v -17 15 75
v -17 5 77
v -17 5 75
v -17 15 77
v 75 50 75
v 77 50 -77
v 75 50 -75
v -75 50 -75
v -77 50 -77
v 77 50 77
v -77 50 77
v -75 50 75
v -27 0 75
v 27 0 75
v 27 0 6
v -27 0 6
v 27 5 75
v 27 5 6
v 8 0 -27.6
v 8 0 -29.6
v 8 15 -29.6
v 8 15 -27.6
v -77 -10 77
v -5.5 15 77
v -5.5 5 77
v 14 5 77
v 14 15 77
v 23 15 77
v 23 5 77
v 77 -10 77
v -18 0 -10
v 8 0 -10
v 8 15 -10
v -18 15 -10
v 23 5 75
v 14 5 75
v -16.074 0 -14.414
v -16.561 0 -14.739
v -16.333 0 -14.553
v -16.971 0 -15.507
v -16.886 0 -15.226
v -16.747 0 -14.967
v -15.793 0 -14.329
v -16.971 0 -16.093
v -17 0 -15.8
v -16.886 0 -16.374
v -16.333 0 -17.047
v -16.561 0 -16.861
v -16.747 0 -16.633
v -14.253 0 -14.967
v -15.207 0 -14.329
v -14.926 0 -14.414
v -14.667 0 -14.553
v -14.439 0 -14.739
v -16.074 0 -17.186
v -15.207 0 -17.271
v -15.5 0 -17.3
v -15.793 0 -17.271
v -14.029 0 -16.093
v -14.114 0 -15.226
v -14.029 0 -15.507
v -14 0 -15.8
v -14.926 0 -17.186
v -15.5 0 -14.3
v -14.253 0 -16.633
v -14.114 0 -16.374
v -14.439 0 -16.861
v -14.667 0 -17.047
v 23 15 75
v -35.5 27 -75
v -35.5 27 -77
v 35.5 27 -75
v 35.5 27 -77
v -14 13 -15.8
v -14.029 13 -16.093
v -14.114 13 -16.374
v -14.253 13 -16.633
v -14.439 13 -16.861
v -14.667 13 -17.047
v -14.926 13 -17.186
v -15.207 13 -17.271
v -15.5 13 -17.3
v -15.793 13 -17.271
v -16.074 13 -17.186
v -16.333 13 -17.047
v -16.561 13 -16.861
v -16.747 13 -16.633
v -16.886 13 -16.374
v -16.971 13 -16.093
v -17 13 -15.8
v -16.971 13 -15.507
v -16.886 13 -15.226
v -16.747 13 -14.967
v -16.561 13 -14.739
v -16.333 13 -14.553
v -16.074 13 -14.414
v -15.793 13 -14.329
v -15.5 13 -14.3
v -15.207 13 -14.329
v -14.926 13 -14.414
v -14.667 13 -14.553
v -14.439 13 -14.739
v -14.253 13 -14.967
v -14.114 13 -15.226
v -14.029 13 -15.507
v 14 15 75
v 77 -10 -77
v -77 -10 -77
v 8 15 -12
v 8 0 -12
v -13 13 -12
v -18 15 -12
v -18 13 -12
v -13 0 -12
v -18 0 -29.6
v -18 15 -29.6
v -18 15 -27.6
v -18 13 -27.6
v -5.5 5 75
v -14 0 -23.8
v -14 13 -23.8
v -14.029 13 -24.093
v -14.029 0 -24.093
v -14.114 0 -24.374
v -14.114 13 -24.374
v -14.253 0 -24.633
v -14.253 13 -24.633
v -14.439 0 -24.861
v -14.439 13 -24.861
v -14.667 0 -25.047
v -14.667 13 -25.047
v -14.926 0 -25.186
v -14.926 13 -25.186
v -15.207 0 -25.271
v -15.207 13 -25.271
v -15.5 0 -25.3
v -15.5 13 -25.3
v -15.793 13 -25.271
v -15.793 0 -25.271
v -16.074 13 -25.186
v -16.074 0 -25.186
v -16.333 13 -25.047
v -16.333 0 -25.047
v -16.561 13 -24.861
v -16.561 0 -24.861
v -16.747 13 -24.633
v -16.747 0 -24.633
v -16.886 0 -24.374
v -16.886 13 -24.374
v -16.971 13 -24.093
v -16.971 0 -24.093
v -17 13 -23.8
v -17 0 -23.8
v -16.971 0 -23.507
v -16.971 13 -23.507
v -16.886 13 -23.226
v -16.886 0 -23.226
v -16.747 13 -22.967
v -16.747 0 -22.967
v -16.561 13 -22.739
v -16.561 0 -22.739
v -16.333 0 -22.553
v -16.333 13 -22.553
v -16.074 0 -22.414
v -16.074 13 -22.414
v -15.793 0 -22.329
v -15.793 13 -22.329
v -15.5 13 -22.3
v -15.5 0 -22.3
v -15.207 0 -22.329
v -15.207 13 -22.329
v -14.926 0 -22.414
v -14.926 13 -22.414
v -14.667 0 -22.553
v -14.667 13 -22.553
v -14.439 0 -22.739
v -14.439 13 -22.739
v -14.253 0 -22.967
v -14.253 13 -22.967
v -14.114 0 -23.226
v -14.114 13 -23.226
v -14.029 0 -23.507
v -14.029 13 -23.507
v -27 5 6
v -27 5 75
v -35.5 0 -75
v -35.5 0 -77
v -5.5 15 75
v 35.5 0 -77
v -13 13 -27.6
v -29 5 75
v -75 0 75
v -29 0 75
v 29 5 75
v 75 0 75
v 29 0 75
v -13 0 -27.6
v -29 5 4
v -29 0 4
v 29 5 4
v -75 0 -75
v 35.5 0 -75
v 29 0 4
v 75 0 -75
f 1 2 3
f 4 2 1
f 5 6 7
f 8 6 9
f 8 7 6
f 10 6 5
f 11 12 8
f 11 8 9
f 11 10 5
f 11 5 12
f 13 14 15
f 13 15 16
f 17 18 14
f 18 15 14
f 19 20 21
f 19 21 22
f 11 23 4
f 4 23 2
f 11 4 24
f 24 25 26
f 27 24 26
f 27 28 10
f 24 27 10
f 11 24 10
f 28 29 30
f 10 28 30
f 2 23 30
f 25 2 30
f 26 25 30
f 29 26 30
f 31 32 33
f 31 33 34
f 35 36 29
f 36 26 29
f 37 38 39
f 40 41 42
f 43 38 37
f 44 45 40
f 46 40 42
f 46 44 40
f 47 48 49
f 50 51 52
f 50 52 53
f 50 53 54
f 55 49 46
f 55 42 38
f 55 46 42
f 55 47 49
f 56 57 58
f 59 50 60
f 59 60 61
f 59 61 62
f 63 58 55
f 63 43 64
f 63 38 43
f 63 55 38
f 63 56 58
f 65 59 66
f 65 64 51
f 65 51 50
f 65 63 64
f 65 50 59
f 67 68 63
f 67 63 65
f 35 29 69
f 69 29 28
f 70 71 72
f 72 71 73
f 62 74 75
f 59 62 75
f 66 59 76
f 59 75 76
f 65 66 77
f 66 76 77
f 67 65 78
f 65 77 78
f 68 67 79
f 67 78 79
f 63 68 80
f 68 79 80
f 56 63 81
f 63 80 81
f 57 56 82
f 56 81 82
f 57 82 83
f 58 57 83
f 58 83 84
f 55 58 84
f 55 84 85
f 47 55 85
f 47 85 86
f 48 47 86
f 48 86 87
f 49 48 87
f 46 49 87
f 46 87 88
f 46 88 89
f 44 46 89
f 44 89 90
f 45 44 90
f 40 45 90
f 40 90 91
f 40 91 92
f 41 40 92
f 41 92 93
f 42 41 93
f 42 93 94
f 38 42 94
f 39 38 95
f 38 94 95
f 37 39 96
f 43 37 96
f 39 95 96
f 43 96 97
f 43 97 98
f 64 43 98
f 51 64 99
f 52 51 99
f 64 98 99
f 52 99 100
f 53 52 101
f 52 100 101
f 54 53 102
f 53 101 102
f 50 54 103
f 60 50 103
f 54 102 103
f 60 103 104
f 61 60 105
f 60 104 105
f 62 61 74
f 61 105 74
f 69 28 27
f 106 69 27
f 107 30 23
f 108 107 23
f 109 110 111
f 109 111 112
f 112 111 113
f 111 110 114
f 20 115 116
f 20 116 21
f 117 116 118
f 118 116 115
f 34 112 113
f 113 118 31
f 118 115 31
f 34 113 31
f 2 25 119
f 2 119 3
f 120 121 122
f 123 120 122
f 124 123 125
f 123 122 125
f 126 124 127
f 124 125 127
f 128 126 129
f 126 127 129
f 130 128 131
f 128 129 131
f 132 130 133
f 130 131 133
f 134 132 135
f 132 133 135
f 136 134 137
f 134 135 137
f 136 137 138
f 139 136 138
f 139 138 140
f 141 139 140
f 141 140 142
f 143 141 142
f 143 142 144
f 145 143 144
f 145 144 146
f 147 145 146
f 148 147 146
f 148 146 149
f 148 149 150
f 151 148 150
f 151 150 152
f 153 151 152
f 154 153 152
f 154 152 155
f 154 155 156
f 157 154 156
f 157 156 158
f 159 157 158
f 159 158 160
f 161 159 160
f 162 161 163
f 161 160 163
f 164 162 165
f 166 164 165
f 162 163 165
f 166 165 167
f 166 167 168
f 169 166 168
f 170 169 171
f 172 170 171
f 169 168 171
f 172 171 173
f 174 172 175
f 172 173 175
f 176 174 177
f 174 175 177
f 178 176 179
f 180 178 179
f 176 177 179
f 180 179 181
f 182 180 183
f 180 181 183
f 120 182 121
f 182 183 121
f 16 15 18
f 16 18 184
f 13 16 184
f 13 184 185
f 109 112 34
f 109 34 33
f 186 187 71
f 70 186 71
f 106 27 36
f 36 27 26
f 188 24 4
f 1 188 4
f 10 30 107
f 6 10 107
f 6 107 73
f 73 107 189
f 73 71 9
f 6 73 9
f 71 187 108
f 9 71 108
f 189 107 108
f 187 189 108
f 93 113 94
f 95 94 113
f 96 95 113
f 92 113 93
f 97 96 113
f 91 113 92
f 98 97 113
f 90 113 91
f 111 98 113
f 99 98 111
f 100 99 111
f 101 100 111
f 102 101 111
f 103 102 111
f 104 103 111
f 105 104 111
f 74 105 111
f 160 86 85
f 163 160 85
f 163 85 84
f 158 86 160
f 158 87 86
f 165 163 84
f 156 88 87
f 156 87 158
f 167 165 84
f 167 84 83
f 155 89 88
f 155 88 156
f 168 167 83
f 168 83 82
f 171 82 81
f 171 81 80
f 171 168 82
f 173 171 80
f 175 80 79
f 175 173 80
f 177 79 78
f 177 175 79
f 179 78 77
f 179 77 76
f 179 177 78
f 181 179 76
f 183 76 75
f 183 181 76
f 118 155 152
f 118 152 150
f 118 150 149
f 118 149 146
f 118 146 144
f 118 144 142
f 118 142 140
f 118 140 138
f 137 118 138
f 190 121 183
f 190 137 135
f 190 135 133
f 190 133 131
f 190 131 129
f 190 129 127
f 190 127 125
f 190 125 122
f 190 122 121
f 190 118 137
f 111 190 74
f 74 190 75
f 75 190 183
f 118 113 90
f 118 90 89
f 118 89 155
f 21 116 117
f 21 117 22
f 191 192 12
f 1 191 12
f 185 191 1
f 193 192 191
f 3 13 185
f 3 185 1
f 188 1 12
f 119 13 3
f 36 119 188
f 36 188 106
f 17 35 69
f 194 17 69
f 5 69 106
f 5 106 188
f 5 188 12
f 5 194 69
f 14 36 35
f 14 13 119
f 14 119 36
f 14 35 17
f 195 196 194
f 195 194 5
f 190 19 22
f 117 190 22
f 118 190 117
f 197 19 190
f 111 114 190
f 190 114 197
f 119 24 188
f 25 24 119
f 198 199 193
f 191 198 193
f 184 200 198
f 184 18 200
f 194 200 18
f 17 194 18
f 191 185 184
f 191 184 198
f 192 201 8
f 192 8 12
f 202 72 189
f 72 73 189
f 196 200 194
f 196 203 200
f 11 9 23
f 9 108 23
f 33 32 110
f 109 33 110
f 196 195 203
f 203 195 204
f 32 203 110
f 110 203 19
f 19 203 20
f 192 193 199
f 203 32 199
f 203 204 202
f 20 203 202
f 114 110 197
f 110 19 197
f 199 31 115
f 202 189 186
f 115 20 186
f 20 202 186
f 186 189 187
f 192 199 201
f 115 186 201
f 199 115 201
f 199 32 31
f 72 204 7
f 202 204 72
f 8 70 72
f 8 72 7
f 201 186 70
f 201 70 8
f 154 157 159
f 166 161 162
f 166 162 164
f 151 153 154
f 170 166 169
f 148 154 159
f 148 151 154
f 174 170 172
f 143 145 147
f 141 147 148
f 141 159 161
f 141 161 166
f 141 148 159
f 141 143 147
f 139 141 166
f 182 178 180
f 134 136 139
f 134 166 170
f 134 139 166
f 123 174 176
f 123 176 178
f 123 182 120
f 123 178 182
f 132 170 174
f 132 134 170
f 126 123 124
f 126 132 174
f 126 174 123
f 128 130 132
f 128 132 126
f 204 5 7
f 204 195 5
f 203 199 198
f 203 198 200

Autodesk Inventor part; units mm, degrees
ref_plane "YZ Plane" through (0, 0, 0) normal (1, 0, 0) x (0, 1, 0)
ref_plane "XZ Plane" through (0, 0, 0) normal (0, 1, 0) x (-1, 0, 0)
ref_plane "XY Plane" through (0, 0, 0) normal (0, 0, 1) x (1, 0, 0)
sketch "草图1" plane through (0, 0, 0) normal (0, 1, 0) x (-1, 0, 0)
  line L0 (77, 77) -> (-77, 77)
  line L1 (-77, 77) -> (-77, -77)
  line L2 (-77, -77) -> (77, -77)
  line L3 (77, -77) -> (77, 77)
  line L4 (0, 0) -> (0, -24)
  line L5 (0, 0) -> (17, 0)
  line L6 (75, 75) -> (-75, 75)
  line L7 (-75, 75) -> (-75, -75)
  line L8 (-75, -75) -> (75, -75)
  line L9 (75, -75) -> (75, 75)
  line L10 (-27, 6) -> (27, 6)
  line L11 (29, 4) -> (-29, 4)
  line L12 (29, 4) -> (29, 75)
  line L13 (-29, 4) -> (-29, 75)
  line L14 (27, 6) -> (27, 75)
  line L15 (-27, 6) -> (-27, 75)
  dimension "d1" = 154
  dimension "d2" = 154
  dimension "d3" = 150
  dimension "d4" = 150
  dimension "d5" = 54
  dimension "d6" = 58
  dimension "d7" = 71
  dimension "d8" = 69
sketch "草图4" plane through (0, 0, 0) normal (0, 1, 0) x (-1, 0, 0)
  line L0 (77, 77) -> (-77, 77)
  line L1 (-77, 77) -> (-77, -77)
  line L2 (-77, -77) -> (77, -77)
  line L3 (77, -77) -> (77, 77)
  line L4 (0, 0) -> (0, -178.4057)
  line L5 (0, 0) -> (-63.1988, 0)
  line L6 (75, 75) -> (-75, 75)
  line L7 (-75, 75) -> (-75, -75)
  line L8 (-75, -75) -> (75, -75)
  line L9 (75, -75) -> (75, 75)
  line L10 (-27, 6) -> (27, 6)
  line L11 (29, 4) -> (-29, 4)
  line L12 (29, 4) -> (29, 75)
  line L13 (-29, 4) -> (-29, 75)
  line L14 (27, 6) -> (27, 75)
  line L15 (-27, 6) -> (-27, 75)
  dimension "d11" = 154
  dimension "d12" = 154
  dimension "d13" = 150
  dimension "d14" = 150
  dimension "d15" = 54
  dimension "d16" = 58
  dimension "d17" = 71
  dimension "d18" = 69
sketch "草图5" plane through (0, 0, 0) normal (0, 1, 0) x (-1, 0, 0)
  line L0 (77, 77) -> (-77, 77)
  line L1 (-77, 77) -> (-77, -77)
  line L2 (-77, -77) -> (77, -77)
  line L3 (77, -77) -> (77, 77)
  line L4 (0, 0) -> (0, -24)
  line L5 (0, 0) -> (17, 0)
  line L6 (75, 75) -> (-75, 75)
  line L7 (-75, 75) -> (-75, -75)
  line L8 (-75, -75) -> (75, -75)
  line L9 (75, -75) -> (75, 75)
  line L10 (-27, 6) -> (27, 6)
  line L11 (29, 4) -> (-29, 4)
  line L12 (29, 4) -> (29, 75)
  line L13 (-29, 4) -> (-29, 75)
  line L14 (27, 6) -> (27, 75)
  line L15 (-27, 6) -> (-27, 75)
  dimension "d19" = 154
  dimension "d20" = 154
  dimension "d21" = 150
  dimension "d22" = 150
  dimension "d23" = 54
  dimension "d24" = 58
  dimension "d25" = 71
  dimension "d26" = 69
sketch "草图6" plane through (0, 0, 0) normal (0, 1, 0) x (-1, 0, 0)
  line L0 (0, 0) -> (0, -24)
  line L1 (0, 0) -> (17, 0)
  line L2 (-75, 75) -> (-75, -75)
  line L3 (-77, 77) -> (-77, -77)
  line L4 (29, 4) -> (-29, 4)
  line L5 (-27, 6) -> (27, 6)
  line L6 (75, 75) -> (-75, 75)
  line L7 (77, 77) -> (-77, 77)
  line L8 (29, 4) -> (29, 75)
  line L9 (27, 6) -> (27, 75)
  line L10 (-29, 4) -> (-29, 75)
  line L11 (-27, 6) -> (-27, 75)
  line L12 (-77, -77) -> (77, -77)
  line L13 (-75, -75) -> (75, -75)
  line L14 (77, -77) -> (77, 77)
  line L15 (75, -75) -> (75, 75)
  dimension "d27" = 154
  dimension "d28" = 154
  dimension "d29" = 150
  dimension "d30" = 150
  dimension "d31" = 54
  dimension "d32" = 58
  dimension "d33" = 71
  dimension "d34" = 69
extrude "拉伸2" add sketch "草图4" along normal blind 5 contours L3 L2 L1 L0 | L6 L15 L10 L14 L12 L11 L13
extrude "拉伸3" add sketch "草图1" against normal blind 10 contours L3 L2 L1 L0 | L9 L8 L7 L6 L13 L11 L12 | L12 L11 L13 L6 L15 L10 L14 | L14 L10 L15 L6
extrude "拉伸4" add sketch "草图5" along normal blind 50
sketch "草图7" plane through (-77, -10, 77) normal (0, 0, 1) x (1, 0, 0)
  line L0 (77, 10) -> (104, 10)
  line L1 (2, 10) -> (152, 10) projected
  line L2 (104, 10) -> (104, 25)
  line L3 (104, 25) -> (50, 25)
  line L4 (50, 25) -> (50, 10)
  line L5 (50, 10) -> (104, 10)
  line L6 (77, 10) -> (77, 15)
  line L7 (77, 15) -> (50, 15)
  line L8 (60, 15) -> (60, 25)
  line L9 (60, 25) -> (50, 25)
  line L10 (60, 25) -> (50, 25)
  line L11 (60, 25) -> (71.5, 25)
  line L12 (71.5, 25) -> (71.5, 15)
  line L13 (50, 25) -> (91, 25)
  line L14 (50, 25) -> (100, 25)
  line L15 (91, 25) -> (91, 15)
  line L16 (91, 15) -> (100, 15)
  line L17 (100, 15) -> (100, 25)
  dimension "d42" = 15
  dimension "d43" = 54
  dimension "d44" = 5
  dimension "d45" = 10
  dimension "d46" = 10
  dimension "d47" = 11.5
  dimension "d48" = 41
  dimension "d49" = 50
  dimension "d50" = 10
extrude "拉伸5" cut sketch "草图7" against normal blind 3 contours L7 L8 L3 L12 | L17 L16 L15 L3
sketch "草图8" plane through (77, -10, -77) normal (0, 0, -1) x (-1, 0, 0)
  line L0 (77, 10) -> (112.5, 10)
  line L1 (50, 10) -> (104, 10) projected
  line L2 (112.5, 10) -> (112.5, 37)
  line L3 (112.5, 37) -> (41.5, 37)
  line L4 (41.5, 37) -> (41.5, 10)
  line L5 (41.5, 10) -> (77, 10)
  dimension "d53" = 35.5
  dimension "d54" = 27
  dimension "d55" = 71
extrude "拉伸6" cut sketch "草图8" against normal blind 3
sketch "草图9" plane through (0, 0, 0) normal (0, 1, 0) x (1, 0, 0)
  line L0 (0, 0) -> (0, 10)
  line L1 (0, 10) -> (-18, 10)
  line L2 (0, 10) -> (8, 10)
  line L3 (8, 10) -> (8, 12)
  line L4 (8, 12) -> (-18, 12)
  line L5 (-18, 12) -> (-18, 10)
  line L6 (0, 12) -> (0, 27.6)
  line L7 (0, 27.6) -> (-18, 27.6)
  line L8 (-18, 27.6) -> (-18, 29.6)
  line L9 (-18, 29.6) -> (8, 29.6)
  line L10 (8, 29.6) -> (8, 27.6)
  line L11 (8, 27.6) -> (0, 27.6)
  line L12 (-18, 27.6) -> (-18, 12)
  line L13 (-18, 12) -> (-13, 12)
  line L14 (-13, 12) -> (-13, 27.6)
  line L15 (-18, 27.6) -> (-13, 27.6)
  dimension "d58" = 10
  dimension "d59" = 18
  dimension "d60" = 8
  dimension "d61" = 15.6
  dimension "d62" = 2
  dimension "d75" = 5
extrude "拉伸8" add sketch "草图9" along normal blind 15 contours L1 L5 L4 L3 L2 | L12 L7 L14 L4 | L8 L9 L10 L11 L7
sketch "草图14" plane through (0, 15, 0) normal (0, 1, 0) x (1, 0, 0)
  line L0 (-13, 12) -> (-13, 27.6) projected
  line L1 (-13, 27.6) -> (-13, 12)
  line L2 (-13, 12) -> (-18, 12)
  line L3 (-18, 12) -> (-18, 27.6)
  line L4 (-18, 27.6) -> (-13, 27.6)
  point P0 (0, 0)
extrude "拉伸9" cut sketch "草图14" against normal blind 2
sketch "草图15" plane through (0, 13, 0) normal (0, 1, 0) x (1, 0, 0)
  line L0 (-18, 27.6) -> (8, 27.6) projected
  line L1 (-18, 27.6) -> (-15.5, 27.6)
  line L2 (-15.5, 27.6) -> (-15.5, 23.8)
  line L3 (-15.5, 23.8) -> (-15.5, 15.8)
  circle A0 centre (-15.5, 23.8) radius 1.5
  circle A1 centre (-15.5, 15.8) radius 1.5
  point P0 (0, 0)
  dimension "d80" = 2.5
  dimension "d81" = 3.8
  dimension "d82" = 8
  dimension "d83" = 3
  dimension "d84" = 3
extrude "拉伸10" cut sketch "草图15" against normal blind 13
properties part number "底座"
